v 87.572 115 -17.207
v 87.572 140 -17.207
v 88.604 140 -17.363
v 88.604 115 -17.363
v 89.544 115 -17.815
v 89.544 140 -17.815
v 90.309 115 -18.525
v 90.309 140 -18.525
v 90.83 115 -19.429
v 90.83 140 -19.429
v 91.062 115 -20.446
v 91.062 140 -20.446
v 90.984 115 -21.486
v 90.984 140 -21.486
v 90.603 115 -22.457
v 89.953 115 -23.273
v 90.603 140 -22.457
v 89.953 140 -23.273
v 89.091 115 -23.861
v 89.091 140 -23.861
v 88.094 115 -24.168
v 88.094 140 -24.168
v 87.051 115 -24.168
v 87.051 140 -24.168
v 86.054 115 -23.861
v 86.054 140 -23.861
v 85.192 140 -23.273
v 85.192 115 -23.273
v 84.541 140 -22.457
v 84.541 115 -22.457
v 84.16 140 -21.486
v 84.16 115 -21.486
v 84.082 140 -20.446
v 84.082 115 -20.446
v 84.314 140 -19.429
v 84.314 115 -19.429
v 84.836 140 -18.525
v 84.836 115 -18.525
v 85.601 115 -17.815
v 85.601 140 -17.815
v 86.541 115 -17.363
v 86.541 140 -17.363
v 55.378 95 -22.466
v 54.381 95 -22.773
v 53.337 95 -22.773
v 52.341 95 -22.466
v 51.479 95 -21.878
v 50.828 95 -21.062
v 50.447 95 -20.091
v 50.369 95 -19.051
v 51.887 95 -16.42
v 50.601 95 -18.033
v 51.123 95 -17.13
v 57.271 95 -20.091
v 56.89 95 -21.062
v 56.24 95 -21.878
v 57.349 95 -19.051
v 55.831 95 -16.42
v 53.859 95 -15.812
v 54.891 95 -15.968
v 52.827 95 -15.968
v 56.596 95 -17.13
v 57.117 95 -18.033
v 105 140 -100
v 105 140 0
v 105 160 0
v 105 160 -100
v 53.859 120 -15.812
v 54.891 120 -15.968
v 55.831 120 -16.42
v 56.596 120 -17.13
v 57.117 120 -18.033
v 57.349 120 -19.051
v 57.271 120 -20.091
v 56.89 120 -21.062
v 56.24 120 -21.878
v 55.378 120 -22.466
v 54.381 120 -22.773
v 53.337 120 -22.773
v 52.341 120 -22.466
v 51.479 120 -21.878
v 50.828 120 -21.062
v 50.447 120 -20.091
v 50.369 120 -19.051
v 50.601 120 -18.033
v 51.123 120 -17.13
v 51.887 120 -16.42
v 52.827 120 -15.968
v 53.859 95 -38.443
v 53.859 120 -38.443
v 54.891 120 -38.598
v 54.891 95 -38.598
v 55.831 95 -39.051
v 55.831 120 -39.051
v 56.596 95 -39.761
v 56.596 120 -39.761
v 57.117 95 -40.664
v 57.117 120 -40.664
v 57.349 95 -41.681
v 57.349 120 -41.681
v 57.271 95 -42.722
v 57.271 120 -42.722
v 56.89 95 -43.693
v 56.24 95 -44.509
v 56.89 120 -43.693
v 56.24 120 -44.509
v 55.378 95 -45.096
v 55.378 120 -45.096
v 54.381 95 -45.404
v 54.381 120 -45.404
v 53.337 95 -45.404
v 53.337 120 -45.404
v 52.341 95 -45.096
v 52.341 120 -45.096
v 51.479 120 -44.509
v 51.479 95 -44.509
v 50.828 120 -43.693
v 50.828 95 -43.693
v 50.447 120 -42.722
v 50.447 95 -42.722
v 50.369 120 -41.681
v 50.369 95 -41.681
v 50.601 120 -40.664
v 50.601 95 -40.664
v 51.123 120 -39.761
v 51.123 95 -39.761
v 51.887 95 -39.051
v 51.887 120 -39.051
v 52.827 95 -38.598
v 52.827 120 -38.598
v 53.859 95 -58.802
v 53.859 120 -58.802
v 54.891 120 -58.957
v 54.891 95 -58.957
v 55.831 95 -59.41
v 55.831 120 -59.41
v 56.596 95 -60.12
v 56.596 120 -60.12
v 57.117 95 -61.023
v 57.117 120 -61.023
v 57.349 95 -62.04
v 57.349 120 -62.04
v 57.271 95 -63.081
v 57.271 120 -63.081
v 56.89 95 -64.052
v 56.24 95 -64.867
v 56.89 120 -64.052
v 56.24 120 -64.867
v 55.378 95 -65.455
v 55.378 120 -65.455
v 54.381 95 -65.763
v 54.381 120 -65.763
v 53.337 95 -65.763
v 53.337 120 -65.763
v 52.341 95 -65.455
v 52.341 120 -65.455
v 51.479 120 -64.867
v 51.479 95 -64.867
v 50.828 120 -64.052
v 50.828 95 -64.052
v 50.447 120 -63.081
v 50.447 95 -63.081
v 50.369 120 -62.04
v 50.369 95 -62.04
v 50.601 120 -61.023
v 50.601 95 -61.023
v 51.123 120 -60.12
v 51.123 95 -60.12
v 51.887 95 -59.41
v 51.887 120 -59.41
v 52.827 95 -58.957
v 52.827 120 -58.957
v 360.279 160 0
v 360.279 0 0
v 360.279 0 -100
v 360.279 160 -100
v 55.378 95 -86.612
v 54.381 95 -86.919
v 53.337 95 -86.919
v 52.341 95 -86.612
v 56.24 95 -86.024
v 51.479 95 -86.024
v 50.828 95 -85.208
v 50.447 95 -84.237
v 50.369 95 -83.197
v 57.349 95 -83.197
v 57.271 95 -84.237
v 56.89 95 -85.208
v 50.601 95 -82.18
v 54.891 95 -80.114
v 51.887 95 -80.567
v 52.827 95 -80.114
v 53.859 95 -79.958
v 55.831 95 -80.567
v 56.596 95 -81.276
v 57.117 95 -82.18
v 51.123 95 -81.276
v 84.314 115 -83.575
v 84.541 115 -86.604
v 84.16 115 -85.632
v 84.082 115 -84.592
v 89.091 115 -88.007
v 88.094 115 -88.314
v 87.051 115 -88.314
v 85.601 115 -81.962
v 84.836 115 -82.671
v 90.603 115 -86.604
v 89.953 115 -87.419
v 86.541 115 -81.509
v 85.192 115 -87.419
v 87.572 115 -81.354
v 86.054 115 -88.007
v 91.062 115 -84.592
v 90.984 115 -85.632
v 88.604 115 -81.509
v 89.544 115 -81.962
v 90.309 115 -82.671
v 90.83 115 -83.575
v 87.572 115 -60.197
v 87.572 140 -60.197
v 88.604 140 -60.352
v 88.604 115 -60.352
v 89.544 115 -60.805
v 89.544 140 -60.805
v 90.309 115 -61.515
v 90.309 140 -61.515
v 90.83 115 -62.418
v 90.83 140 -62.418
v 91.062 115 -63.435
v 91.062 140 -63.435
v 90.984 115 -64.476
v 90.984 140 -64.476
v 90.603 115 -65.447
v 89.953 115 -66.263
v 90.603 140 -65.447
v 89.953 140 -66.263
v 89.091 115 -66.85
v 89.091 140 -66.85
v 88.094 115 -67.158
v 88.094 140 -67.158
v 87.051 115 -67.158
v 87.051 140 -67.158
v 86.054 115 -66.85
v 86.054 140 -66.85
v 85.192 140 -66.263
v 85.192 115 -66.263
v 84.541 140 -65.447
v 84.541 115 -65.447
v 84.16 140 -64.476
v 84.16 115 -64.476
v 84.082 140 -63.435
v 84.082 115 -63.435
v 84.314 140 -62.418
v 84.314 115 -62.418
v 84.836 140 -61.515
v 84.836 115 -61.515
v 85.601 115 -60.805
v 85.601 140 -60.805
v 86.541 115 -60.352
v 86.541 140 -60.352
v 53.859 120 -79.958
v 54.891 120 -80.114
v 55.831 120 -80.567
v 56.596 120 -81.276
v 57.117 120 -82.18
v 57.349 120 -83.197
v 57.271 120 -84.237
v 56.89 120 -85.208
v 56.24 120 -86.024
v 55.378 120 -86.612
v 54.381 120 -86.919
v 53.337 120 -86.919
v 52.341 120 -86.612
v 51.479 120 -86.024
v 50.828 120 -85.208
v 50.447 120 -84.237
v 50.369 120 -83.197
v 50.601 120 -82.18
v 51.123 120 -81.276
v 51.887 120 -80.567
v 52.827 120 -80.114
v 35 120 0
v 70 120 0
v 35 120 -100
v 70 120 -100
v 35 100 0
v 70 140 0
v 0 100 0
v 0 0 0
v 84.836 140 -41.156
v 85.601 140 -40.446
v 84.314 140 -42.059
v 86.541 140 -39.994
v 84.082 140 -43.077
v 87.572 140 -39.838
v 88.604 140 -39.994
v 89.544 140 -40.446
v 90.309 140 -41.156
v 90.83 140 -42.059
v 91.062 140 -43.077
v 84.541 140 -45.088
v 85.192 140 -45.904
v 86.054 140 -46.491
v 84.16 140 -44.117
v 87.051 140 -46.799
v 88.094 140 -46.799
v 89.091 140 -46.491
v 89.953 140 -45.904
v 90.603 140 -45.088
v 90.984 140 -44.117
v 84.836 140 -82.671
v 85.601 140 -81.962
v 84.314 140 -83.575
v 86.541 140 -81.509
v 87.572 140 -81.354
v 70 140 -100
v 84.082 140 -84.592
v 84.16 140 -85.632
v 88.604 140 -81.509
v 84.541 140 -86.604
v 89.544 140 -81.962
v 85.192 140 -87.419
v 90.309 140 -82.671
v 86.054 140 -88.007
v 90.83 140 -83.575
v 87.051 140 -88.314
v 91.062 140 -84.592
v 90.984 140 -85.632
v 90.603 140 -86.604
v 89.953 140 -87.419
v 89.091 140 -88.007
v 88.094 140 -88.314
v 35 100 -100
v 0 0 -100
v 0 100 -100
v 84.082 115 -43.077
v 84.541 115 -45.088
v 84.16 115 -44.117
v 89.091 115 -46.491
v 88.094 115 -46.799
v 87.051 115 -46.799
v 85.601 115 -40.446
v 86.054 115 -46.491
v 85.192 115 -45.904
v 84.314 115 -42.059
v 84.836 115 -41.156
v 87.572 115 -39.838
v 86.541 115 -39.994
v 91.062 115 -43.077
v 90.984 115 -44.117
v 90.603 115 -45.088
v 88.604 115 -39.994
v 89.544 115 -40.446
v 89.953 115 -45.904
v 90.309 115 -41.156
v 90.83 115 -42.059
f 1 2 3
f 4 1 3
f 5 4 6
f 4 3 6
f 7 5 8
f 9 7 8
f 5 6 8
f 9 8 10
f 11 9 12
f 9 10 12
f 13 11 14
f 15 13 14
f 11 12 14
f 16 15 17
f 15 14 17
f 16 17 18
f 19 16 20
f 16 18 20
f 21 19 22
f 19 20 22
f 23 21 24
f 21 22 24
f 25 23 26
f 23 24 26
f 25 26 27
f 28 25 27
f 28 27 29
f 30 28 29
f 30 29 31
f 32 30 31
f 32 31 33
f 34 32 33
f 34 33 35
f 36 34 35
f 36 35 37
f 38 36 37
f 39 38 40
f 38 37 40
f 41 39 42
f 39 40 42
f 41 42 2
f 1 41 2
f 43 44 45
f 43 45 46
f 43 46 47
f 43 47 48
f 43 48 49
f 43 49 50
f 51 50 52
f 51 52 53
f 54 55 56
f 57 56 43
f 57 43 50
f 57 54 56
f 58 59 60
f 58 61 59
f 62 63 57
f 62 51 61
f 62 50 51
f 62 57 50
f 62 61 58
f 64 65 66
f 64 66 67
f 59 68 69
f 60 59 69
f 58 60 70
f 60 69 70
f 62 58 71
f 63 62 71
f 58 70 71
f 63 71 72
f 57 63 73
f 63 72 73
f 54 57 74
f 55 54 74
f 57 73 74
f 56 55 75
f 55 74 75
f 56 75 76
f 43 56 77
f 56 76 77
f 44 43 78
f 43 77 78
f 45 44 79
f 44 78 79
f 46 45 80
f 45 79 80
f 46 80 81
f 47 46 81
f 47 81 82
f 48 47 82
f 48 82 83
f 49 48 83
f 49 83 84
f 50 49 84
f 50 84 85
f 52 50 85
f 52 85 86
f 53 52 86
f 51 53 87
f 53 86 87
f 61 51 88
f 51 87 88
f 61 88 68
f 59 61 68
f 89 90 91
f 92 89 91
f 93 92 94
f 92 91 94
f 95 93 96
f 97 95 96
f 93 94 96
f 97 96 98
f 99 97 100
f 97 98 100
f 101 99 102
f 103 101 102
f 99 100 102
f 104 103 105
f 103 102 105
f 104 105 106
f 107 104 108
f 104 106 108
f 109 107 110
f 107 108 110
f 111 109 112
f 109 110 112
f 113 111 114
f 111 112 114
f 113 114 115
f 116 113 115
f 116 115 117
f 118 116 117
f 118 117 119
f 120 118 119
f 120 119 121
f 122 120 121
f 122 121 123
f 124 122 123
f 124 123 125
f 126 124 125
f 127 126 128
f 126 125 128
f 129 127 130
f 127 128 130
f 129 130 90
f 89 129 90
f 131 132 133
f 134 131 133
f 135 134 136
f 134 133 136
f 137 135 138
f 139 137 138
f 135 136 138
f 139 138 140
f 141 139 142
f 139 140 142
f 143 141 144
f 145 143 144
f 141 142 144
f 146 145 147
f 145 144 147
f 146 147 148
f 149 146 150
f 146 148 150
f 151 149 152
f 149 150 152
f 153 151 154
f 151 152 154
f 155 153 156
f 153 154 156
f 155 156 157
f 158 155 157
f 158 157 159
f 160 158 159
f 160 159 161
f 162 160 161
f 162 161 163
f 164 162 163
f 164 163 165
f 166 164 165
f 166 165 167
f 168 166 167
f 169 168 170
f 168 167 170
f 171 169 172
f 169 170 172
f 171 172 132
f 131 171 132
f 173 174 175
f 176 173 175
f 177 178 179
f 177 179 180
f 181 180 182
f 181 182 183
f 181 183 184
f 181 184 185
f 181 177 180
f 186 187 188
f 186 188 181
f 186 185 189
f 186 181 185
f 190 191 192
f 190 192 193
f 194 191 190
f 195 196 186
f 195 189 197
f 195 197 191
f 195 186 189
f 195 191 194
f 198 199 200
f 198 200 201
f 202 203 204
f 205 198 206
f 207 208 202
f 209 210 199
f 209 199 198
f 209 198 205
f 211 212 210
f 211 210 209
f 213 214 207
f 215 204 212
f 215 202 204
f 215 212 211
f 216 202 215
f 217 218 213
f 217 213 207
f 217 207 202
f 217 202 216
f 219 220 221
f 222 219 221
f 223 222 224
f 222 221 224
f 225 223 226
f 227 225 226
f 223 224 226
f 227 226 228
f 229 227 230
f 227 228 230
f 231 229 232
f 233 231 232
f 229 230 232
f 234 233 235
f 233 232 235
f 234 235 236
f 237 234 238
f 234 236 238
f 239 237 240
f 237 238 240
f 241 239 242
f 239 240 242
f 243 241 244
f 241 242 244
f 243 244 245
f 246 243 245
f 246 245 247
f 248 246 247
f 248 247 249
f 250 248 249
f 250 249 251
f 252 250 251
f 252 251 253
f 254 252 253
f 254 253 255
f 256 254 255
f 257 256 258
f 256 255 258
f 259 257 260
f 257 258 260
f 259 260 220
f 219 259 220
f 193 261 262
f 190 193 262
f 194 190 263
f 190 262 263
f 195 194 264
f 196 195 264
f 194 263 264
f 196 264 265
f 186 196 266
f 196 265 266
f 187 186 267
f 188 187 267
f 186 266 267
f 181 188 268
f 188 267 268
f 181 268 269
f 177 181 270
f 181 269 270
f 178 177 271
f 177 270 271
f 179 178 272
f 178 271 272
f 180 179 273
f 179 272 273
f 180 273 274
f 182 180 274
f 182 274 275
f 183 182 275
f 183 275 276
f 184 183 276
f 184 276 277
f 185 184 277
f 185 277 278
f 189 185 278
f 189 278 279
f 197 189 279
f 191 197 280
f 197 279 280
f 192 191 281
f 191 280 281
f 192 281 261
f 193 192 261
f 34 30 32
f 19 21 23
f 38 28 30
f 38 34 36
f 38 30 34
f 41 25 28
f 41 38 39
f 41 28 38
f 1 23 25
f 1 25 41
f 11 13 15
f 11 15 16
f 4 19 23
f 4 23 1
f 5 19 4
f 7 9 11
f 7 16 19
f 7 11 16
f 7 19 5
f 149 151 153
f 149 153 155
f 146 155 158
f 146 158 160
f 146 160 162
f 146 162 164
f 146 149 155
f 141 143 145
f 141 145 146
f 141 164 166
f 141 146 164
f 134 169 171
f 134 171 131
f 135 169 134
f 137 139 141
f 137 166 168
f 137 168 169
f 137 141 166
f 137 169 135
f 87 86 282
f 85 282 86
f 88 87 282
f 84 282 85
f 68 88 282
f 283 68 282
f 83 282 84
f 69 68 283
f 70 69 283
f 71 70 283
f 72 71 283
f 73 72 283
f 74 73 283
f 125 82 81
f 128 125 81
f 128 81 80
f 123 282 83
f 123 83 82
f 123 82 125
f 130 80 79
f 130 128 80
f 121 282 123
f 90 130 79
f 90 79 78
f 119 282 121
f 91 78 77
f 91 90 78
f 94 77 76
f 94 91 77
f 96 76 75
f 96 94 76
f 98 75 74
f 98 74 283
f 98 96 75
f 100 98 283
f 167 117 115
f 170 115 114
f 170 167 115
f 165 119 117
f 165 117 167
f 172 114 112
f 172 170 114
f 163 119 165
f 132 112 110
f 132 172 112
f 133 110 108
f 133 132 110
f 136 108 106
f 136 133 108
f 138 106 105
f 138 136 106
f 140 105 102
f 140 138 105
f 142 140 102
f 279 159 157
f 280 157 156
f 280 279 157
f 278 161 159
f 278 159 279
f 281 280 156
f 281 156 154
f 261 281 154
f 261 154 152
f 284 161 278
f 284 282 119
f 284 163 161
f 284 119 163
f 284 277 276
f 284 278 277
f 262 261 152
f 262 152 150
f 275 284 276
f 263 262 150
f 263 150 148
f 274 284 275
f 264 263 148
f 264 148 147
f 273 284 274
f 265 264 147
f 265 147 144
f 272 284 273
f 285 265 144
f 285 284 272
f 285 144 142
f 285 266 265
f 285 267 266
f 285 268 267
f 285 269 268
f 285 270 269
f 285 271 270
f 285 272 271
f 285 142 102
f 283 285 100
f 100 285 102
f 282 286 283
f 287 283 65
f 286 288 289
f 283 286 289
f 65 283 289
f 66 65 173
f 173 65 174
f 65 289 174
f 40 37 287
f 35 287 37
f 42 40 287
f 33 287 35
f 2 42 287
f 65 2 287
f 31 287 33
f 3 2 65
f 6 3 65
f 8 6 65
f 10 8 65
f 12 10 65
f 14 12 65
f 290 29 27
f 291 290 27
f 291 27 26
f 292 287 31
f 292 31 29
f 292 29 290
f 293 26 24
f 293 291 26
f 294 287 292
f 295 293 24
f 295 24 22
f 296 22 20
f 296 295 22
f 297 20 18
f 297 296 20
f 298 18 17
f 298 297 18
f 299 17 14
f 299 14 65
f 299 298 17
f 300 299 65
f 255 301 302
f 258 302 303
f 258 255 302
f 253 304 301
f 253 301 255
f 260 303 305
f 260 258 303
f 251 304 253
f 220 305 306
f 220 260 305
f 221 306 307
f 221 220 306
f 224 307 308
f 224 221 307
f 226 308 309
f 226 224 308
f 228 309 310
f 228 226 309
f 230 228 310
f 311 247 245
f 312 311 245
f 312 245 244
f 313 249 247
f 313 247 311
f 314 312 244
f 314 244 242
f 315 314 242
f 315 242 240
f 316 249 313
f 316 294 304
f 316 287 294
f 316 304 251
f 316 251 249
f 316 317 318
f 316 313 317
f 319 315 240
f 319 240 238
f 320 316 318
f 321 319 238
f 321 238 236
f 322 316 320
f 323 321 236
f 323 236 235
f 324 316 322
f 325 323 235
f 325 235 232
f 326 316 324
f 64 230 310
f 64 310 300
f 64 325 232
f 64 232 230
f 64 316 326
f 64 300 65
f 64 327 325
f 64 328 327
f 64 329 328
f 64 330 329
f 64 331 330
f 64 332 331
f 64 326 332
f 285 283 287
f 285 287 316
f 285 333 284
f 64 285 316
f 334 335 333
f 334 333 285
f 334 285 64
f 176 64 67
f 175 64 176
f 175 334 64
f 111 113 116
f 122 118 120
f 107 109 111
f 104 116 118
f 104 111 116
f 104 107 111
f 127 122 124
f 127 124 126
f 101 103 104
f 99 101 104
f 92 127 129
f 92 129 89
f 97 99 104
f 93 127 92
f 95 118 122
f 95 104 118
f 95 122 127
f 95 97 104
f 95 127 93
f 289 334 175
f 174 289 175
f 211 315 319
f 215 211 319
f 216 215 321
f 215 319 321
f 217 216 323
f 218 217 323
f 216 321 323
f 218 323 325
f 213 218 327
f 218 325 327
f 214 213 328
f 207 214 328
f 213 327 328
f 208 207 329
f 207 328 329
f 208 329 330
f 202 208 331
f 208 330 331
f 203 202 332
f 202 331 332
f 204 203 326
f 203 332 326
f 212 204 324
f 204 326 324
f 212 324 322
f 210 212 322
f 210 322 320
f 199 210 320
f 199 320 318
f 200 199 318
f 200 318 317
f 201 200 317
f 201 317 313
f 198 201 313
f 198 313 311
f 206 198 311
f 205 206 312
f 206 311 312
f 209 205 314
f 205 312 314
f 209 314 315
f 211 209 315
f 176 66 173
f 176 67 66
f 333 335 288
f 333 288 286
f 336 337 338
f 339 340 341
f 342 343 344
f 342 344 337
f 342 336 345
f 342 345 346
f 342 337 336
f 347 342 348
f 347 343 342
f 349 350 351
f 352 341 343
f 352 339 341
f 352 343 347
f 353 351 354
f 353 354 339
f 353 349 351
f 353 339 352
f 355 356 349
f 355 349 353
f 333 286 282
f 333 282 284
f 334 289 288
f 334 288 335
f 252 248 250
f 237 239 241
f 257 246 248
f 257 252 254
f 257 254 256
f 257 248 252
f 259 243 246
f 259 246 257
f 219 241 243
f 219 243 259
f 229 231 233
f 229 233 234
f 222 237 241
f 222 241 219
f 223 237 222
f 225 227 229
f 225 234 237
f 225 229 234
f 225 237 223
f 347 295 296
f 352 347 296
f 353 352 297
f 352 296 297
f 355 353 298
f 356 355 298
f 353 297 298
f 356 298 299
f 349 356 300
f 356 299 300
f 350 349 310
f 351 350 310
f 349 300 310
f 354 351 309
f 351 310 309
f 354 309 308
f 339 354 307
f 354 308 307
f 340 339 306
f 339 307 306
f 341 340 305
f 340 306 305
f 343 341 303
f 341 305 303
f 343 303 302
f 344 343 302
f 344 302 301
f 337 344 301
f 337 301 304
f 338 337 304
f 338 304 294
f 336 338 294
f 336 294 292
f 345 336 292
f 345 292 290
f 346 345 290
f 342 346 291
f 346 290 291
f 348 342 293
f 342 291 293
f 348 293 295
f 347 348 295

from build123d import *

# Parameters (mm, degrees)
SKETCH_1_W          = 35
SKETCH_1_H          = 100
EXTRUDE_1_DEPTH     = 100
SKETCH_1_3_W        = 35
SKETCH_1_3_H        = 100
EXTRUDE_2_DEPTH     = 120
SKETCH_1_4_W        = 35
SKETCH_1_4_H        = 100
EXTRUDE_3_DEPTH     = 140
SKETCH_1_5_W        = 195.279005499
SKETCH_1_5_H        = 100
EXTRUDE_4_DEPTH     = 160
SKETCH_1_6_W        = 60
SKETCH_1_6_H        = 100
EXTRUDE_5_DEPTH     = 160
SKETCH_17_R         = 3.5
CUT_EXTRUDE_4_DEPTH = 25
SKETCH_18_R         = 3.5
CUT_EXTRUDE_5_DEPTH = 25


with BuildPart() as part:
    # Эскиз1 → Бобышка-Вытянуть1 (new body)
    with BuildSketch(Plane(origin=(0, 0, 0), x_dir=(1, 0, 0), z_dir=(0, 1, 0))):
        with Locations((17.5, 50)):
            Rectangle(SKETCH_1_W, SKETCH_1_H)
    extrude(amount=EXTRUDE_1_DEPTH)

    # Эскиз1<3> → Бобышка-Вытянуть2 (add)
    with BuildSketch(Plane(origin=(0, 0, 0), x_dir=(1, 0, 0), z_dir=(0, 1, 0))):
        with Locations((52.5, 50)):
            Rectangle(SKETCH_1_3_W, SKETCH_1_3_H)
    extrude(amount=EXTRUDE_2_DEPTH)

    # Эскиз1<4> → Бобышка-Вытянуть3 (add)
    with BuildSketch(Plane(origin=(0, 0, 0), x_dir=(1, 0, 0), z_dir=(0, 1, 0))):
        with Locations((87.5, 50)):
            Rectangle(SKETCH_1_4_W, SKETCH_1_4_H)
    extrude(amount=EXTRUDE_3_DEPTH)

    # Эскиз1<5> → Бобышка-Вытянуть4 (add)
    with BuildSketch(Plane(origin=(0, 0, 0), x_dir=(1, 0, 0), z_dir=(0, 1, 0))):
        with Locations((202.639502749, 50)):
            Rectangle(SKETCH_1_5_W, SKETCH_1_5_H)
    extrude(amount=EXTRUDE_4_DEPTH)

    # Эскиз1<6> → Бобышка-Вытянуть5 (add)
    with BuildSketch(Plane(origin=(0, 0, 0), x_dir=(1, 0, 0), z_dir=(0, 1, 0))):
        with Locations((330.279005499, 50)):
            Rectangle(SKETCH_1_6_W, SKETCH_1_6_H)
    extrude(amount=EXTRUDE_5_DEPTH)

    # Эскиз17 → Вырез-Вытянуть4 (cut)
    with BuildSketch(Plane(origin=(0, 120, 0), x_dir=(1, 0, 0), z_dir=(0, 1, 0))):
        with Locations((53.859111314, 83.458390634)):
            Circle(SKETCH_17_R)
        with Locations((53.859111314, 62.301745528)):
            Circle(SKETCH_17_R)
        with Locations((53.859111314, 41.942908687)):
            Circle(SKETCH_17_R)
        with Locations((53.859111314, 19.312140714)):
            Circle(SKETCH_17_R)
    extrude(amount=-CUT_EXTRUDE_4_DEPTH, mode=Mode.SUBTRACT)

    # Эскиз18 → Вырез-Вытянуть5 (cut)
    with BuildSketch(Plane(origin=(0, 140, 0), x_dir=(1, 0, 0), z_dir=(0, 1, 0))):
        with Locations((87.572175359, 84.853566518)):
            Circle(SKETCH_18_R)
        with Locations((87.572175359, 63.696921411)):
            Circle(SKETCH_18_R)
        with Locations((87.572175359, 43.338084571)):
            Circle(SKETCH_18_R)
        with Locations((87.572175359, 20.707316598)):
            Circle(SKETCH_18_R)
    extrude(amount=-CUT_EXTRUDE_5_DEPTH, mode=Mode.SUBTRACT)


solid = part.part
